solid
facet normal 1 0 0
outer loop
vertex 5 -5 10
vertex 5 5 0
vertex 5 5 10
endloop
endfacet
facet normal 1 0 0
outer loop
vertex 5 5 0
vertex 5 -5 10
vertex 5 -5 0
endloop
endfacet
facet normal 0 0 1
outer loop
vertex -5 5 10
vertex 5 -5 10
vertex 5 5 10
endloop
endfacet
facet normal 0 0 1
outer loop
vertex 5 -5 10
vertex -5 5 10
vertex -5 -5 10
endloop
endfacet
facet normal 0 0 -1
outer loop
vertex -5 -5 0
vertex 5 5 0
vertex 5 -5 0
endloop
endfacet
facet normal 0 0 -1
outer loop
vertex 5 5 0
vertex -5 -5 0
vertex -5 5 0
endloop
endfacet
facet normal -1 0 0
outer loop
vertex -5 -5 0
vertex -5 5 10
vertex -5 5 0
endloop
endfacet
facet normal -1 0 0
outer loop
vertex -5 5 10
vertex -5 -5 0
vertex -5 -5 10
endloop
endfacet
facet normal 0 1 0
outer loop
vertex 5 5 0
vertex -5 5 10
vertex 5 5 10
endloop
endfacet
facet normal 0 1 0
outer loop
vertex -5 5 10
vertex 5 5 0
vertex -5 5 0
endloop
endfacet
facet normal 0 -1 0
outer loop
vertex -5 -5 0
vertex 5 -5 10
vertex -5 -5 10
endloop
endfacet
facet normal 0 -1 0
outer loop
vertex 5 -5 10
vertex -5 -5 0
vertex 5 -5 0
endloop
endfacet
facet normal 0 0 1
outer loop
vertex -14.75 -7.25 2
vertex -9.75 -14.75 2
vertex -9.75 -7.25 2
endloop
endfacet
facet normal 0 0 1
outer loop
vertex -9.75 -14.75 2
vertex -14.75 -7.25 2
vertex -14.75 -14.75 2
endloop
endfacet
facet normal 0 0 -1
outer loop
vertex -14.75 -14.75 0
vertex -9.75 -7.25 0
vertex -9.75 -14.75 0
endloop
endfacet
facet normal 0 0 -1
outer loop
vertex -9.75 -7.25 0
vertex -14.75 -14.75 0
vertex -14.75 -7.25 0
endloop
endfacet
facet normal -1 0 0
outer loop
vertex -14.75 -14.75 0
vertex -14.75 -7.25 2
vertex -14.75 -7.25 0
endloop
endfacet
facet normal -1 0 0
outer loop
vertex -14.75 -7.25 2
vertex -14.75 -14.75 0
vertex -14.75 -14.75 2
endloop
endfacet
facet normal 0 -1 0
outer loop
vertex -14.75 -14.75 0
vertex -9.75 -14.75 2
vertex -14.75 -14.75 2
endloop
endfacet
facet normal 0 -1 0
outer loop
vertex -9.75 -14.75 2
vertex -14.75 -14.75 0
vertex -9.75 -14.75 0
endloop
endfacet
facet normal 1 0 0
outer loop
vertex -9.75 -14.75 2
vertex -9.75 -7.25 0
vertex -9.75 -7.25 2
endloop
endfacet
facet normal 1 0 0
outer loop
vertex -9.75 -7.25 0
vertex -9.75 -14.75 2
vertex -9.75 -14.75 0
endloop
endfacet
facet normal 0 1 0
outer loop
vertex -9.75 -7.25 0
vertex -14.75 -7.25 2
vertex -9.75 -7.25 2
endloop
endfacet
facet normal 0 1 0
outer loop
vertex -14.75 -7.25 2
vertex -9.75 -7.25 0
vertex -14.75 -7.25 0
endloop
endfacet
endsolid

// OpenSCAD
translate([0, 0, 5]) color([0,1,0,0.9]) cube([10, 10, 10], center=true);
translate([-14.5, -14.5, 1]) color([1,0,0]) cube([0.5, 0.5, 2], center=true);
translate([-14.0, -14.5, 1]) color([1,0,0]) cube([0.5, 0.5, 2], center=true);
translate([-13.5, -14.5, 1]) color([1,0,0]) cube([0.5, 0.5, 2], center=true);
translate([-13.0, -14.5, 1]) color([1,0,0]) cube([0.5, 0.5, 2], center=true);
translate([-12.5, -14.5, 1]) color([1,0,0]) cube([0.5, 0.5, 2], center=true);
translate([-12.0, -14.5, 1]) color([1,0,0]) cube([0.5, 0.5, 2], center=true);
translate([-11.5, -14.5, 1]) color([1,0,0]) cube([0.5, 0.5, 2], center=true);
translate([-11.0, -14.5, 1]) color([1,0,0]) cube([0.5, 0.5, 2], center=true);
translate([-10.5, -14.5, 1]) color([1,0,0]) cube([0.5, 0.5, 2], center=true);
translate([-10.0, -14.5, 1]) color([1,0,0]) cube([0.5, 0.5, 2], center=true);
translate([-14.5, -14.0, 1]) color([1,0,0]) cube([0.5, 0.5, 2], center=true);
translate([-14.0, -14.0, 1]) color([1,0,0]) cube([0.5, 0.5, 2], center=true);
translate([-13.5, -14.0, 1]) color([1,0,0]) cube([0.5, 0.5, 2], center=true);
translate([-13.0, -14.0, 1]) color([1,0,0]) cube([0.5, 0.5, 2], center=true);
translate([-12.5, -14.0, 1]) color([1,0,0]) cube([0.5, 0.5, 2], center=true);
translate([-12.0, -14.0, 1]) color([1,0,0]) cube([0.5, 0.5, 2], center=true);
translate([-11.5, -14.0, 1]) color([1,0,0]) cube([0.5, 0.5, 2], center=true);
translate([-11.0, -14.0, 1]) color([1,0,0]) cube([0.5, 0.5, 2], center=true);
translate([-10.5, -14.0, 1]) color([1,0,0]) cube([0.5, 0.5, 2], center=true);
translate([-10.0, -14.0, 1]) color([1,0,0]) cube([0.5, 0.5, 2], center=true);
translate([-14.5, -13.5, 1]) color([1,0,0]) cube([0.5, 0.5, 2], center=true);
translate([-14.0, -13.5, 1]) color([1,0,0]) cube([0.5, 0.5, 2], center=true);
translate([-13.5, -13.5, 1]) color([1,0,0]) cube([0.5, 0.5, 2], center=true);
translate([-13.0, -13.5, 1]) color([1,0,0]) cube([0.5, 0.5, 2], center=true);
translate([-12.5, -13.5, 1]) color([1,0,0]) cube([0.5, 0.5, 2], center=true);
translate([-12.0, -13.5, 1]) color([1,0,0]) cube([0.5, 0.5, 2], center=true);
translate([-11.5, -13.5, 1]) color([1,0,0]) cube([0.5, 0.5, 2], center=true);
translate([-11.0, -13.5, 1]) color([1,0,0]) cube([0.5, 0.5, 2], center=true);
translate([-10.5, -13.5, 1]) color([1,0,0]) cube([0.5, 0.5, 2], center=true);
translate([-10.0, -13.5, 1]) color([1,0,0]) cube([0.5, 0.5, 2], center=true);
translate([-14.5, -13.0, 1]) color([1,0,0]) cube([0.5, 0.5, 2], center=true);
translate([-14.0, -13.0, 1]) color([1,0,0]) cube([0.5, 0.5, 2], center=true);
translate([-13.5, -13.0, 1]) color([1,0,0]) cube([0.5, 0.5, 2], center=true);
translate([-13.0, -13.0, 1]) color([1,0,0]) cube([0.5, 0.5, 2], center=true);
translate([-12.5, -13.0, 1]) color([1,0,0]) cube([0.5, 0.5, 2], center=true);
translate([-12.0, -13.0, 1]) color([1,0,0]) cube([0.5, 0.5, 2], center=true);
translate([-11.5, -13.0, 1]) color([1,0,0]) cube([0.5, 0.5, 2], center=true);
translate([-11.0, -13.0, 1]) color([1,0,0]) cube([0.5, 0.5, 2], center=true);
translate([-10.5, -13.0, 1]) color([1,0,0]) cube([0.5, 0.5, 2], center=true);
translate([-10.0, -13.0, 1]) color([1,0,0]) cube([0.5, 0.5, 2], center=true);
translate([-14.5, -12.5, 1]) color([1,0,0]) cube([0.5, 0.5, 2], center=true);
translate([-14.0, -12.5, 1]) color([1,0,0]) cube([0.5, 0.5, 2], center=true);
translate([-13.5, -12.5, 1]) color([1,0,0]) cube([0.5, 0.5, 2], center=true);
translate([-13.0, -12.5, 1]) color([1,0,0]) cube([0.5, 0.5, 2], center=true);
translate([-12.5, -12.5, 1]) color([1,0,0]) cube([0.5, 0.5, 2], center=true);
translate([-12.0, -12.5, 1]) color([1,0,0]) cube([0.5, 0.5, 2], center=true);
translate([-11.5, -12.5, 1]) color([1,0,0]) cube([0.5, 0.5, 2], center=true);
translate([-11.0, -12.5, 1]) color([1,0,0]) cube([0.5, 0.5, 2], center=true);
translate([-10.5, -12.5, 1]) color([1,0,0]) cube([0.5, 0.5, 2], center=true);
translate([-10.0, -12.5, 1]) color([1,0,0]) cube([0.5, 0.5, 2], center=true);
translate([-14.5, -12.0, 1]) color([1,0,0]) cube([0.5, 0.5, 2], center=true);
translate([-14.0, -12.0, 1]) color([1,0,0]) cube([0.5, 0.5, 2], center=true);
translate([-13.5, -12.0, 1]) color([1,0,0]) cube([0.5, 0.5, 2], center=true);
translate([-13.0, -12.0, 1]) color([1,0,0]) cube([0.5, 0.5, 2], center=true);
translate([-12.5, -12.0, 1]) color([1,0,0]) cube([0.5, 0.5, 2], center=true);
translate([-12.0, -12.0, 1]) color([1,0,0]) cube([0.5, 0.5, 2], center=true);
translate([-11.5, -12.0, 1]) color([1,0,0]) cube([0.5, 0.5, 2], center=true);
translate([-11.0, -12.0, 1]) color([1,0,0]) cube([0.5, 0.5, 2], center=true);
translate([-10.5, -12.0, 1]) color([1,0,0]) cube([0.5, 0.5, 2], center=true);
translate([-10.0, -12.0, 1]) color([1,0,0]) cube([0.5, 0.5, 2], center=true);
translate([-14.5, -11.5, 1]) color([1,0,0]) cube([0.5, 0.5, 2], center=true);
translate([-14.0, -11.5, 1]) color([1,0,0]) cube([0.5, 0.5, 2], center=true);
translate([-13.5, -11.5, 1]) color([1,0,0]) cube([0.5, 0.5, 2], center=true);
translate([-13.0, -11.5, 1]) color([1,0,0]) cube([0.5, 0.5, 2], center=true);
translate([-12.5, -11.5, 1]) color([1,0,0]) cube([0.5, 0.5, 2], center=true);
translate([-12.0, -11.5, 1]) color([1,0,0]) cube([0.5, 0.5, 2], center=true);
translate([-11.5, -11.5, 1]) color([1,0,0]) cube([0.5, 0.5, 2], center=true);
translate([-11.0, -11.5, 1]) color([1,0,0]) cube([0.5, 0.5, 2], center=true);
translate([-10.5, -11.5, 1]) color([1,0,0]) cube([0.5, 0.5, 2], center=true);
translate([-10.0, -11.5, 1]) color([1,0,0]) cube([0.5, 0.5, 2], center=true);
translate([-14.5, -11.0, 1]) color([1,0,0]) cube([0.5, 0.5, 2], center=true);
translate([-14.0, -11.0, 1]) color([1,0,0]) cube([0.5, 0.5, 2], center=true);
translate([-13.5, -11.0, 1]) color([1,0,0]) cube([0.5, 0.5, 2], center=true);
translate([-13.0, -11.0, 1]) color([1,0,0]) cube([0.5, 0.5, 2], center=true);
translate([-12.5, -11.0, 1]) color([1,0,0]) cube([0.5, 0.5, 2], center=true);
translate([-12.0, -11.0, 1]) color([1,0,0]) cube([0.5, 0.5, 2], center=true);
translate([-11.5, -11.0, 1]) color([1,0,0]) cube([0.5, 0.5, 2], center=true);
translate([-11.0, -11.0, 1]) color([1,0,0]) cube([0.5, 0.5, 2], center=true);
translate([-10.5, -11.0, 1]) color([1,0,0]) cube([0.5, 0.5, 2], center=true);
translate([-10.0, -11.0, 1]) color([1,0,0]) cube([0.5, 0.5, 2], center=true);
translate([-14.5, -10.5, 1]) color([1,0,0]) cube([0.5, 0.5, 2], center=true);
translate([-14.0, -10.5, 1]) color([1,0,0]) cube([0.5, 0.5, 2], center=true);
translate([-13.5, -10.5, 1]) color([1,0,0]) cube([0.5, 0.5, 2], center=true);
translate([-13.0, -10.5, 1]) color([1,0,0]) cube([0.5, 0.5, 2], center=true);
translate([-12.5, -10.5, 1]) color([1,0,0]) cube([0.5, 0.5, 2], center=true);
translate([-12.0, -10.5, 1]) color([1,0,0]) cube([0.5, 0.5, 2], center=true);
translate([-11.5, -10.5, 1]) color([1,0,0]) cube([0.5, 0.5, 2], center=true);
translate([-11.0, -10.5, 1]) color([1,0,0]) cube([0.5, 0.5, 2], center=true);
translate([-10.5, -10.5, 1]) color([1,0,0]) cube([0.5, 0.5, 2], center=true);
translate([-10.0, -10.5, 1]) color([1,0,0]) cube([0.5, 0.5, 2], center=true);
translate([-14.5, -10.0, 1]) color([1,0,0]) cube([0.5, 0.5, 2], center=true);
translate([-14.0, -10.0, 1]) color([1,0,0]) cube([0.5, 0.5, 2], center=true);
translate([-13.5, -10.0, 1]) color([1,0,0]) cube([0.5, 0.5, 2], center=true);
translate([-13.0, -10.0, 1]) color([1,0,0]) cube([0.5, 0.5, 2], center=true);
translate([-12.5, -10.0, 1]) color([1,0,0]) cube([0.5, 0.5, 2], center=true);
translate([-12.0, -10.0, 1]) color([1,0,0]) cube([0.5, 0.5, 2], center=true);
translate([-11.5, -10.0, 1]) color([1,0,0]) cube([0.5, 0.5, 2], center=true);
translate([-11.0, -10.0, 1]) color([1,0,0]) cube([0.5, 0.5, 2], center=true);
translate([-10.5, -10.0, 1]) color([1,0,0]) cube([0.5, 0.5, 2], center=true);
translate([-10.0, -10.0, 1]) color([1,0,0]) cube([0.5, 0.5, 2], center=true);
translate([-14.5, -9.5, 1]) color([1,0,0]) cube([0.5, 0.5, 2], center=true);
translate([-14.0, -9.5, 1]) color([1,0,0]) cube([0.5, 0.5, 2], center=true);
translate([-13.5, -9.5, 1]) color([1,0,0]) cube([0.5, 0.5, 2], center=true);
translate([-13.0, -9.5, 1]) color([1,0,0]) cube([0.5, 0.5, 2], center=true);
translate([-12.5, -9.5, 1]) color([1,0,0]) cube([0.5, 0.5, 2], center=true);
translate([-12.0, -9.5, 1]) color([1,0,0]) cube([0.5, 0.5, 2], center=true);
translate([-11.5, -9.5, 1]) color([1,0,0]) cube([0.5, 0.5, 2], center=true);
translate([-11.0, -9.5, 1]) color([1,0,0]) cube([0.5, 0.5, 2], center=true);
translate([-10.5, -9.5, 1]) color([1,0,0]) cube([0.5, 0.5, 2], center=true);
translate([-10.0, -9.5, 1]) color([1,0,0]) cube([0.5, 0.5, 2], center=true);
translate([-14.5, -9.0, 1]) color([1,0,0]) cube([0.5, 0.5, 2], center=true);
translate([-14.0, -9.0, 1]) color([1,0,0]) cube([0.5, 0.5, 2], center=true);
translate([-13.5, -9.0, 1]) color([1,0,0]) cube([0.5, 0.5, 2], center=true);
translate([-13.0, -9.0, 1]) color([1,0,0]) cube([0.5, 0.5, 2], center=true);
translate([-12.5, -9.0, 1]) color([1,0,0]) cube([0.5, 0.5, 2], center=true);
translate([-12.0, -9.0, 1]) color([1,0,0]) cube([0.5, 0.5, 2], center=true);
translate([-11.5, -9.0, 1]) color([1,0,0]) cube([0.5, 0.5, 2], center=true);
translate([-11.0, -9.0, 1]) color([1,0,0]) cube([0.5, 0.5, 2], center=true);
translate([-10.5, -9.0, 1]) color([1,0,0]) cube([0.5, 0.5, 2], center=true);
translate([-10.0, -9.0, 1]) color([1,0,0]) cube([0.5, 0.5, 2], center=true);
translate([-14.5, -8.5, 1]) color([1,0,0]) cube([0.5, 0.5, 2], center=true);
translate([-14.0, -8.5, 1]) color([1,0,0]) cube([0.5, 0.5, 2], center=true);
translate([-13.5, -8.5, 1]) color([1,0,0]) cube([0.5, 0.5, 2], center=true);
translate([-13.0, -8.5, 1]) color([1,0,0]) cube([0.5, 0.5, 2], center=true);
translate([-12.5, -8.5, 1]) color([1,0,0]) cube([0.5, 0.5, 2], center=true);
translate([-12.0, -8.5, 1]) color([1,0,0]) cube([0.5, 0.5, 2], center=true);
translate([-11.5, -8.5, 1]) color([1,0,0]) cube([0.5, 0.5, 2], center=true);
translate([-11.0, -8.5, 1]) color([1,0,0]) cube([0.5, 0.5, 2], center=true);
translate([-10.5, -8.5, 1]) color([1,0,0]) cube([0.5, 0.5, 2], center=true);
translate([-10.0, -8.5, 1]) color([1,0,0]) cube([0.5, 0.5, 2], center=true);
translate([-14.5, -8.0, 1]) color([1,0,0]) cube([0.5, 0.5, 2], center=true);
translate([-14.0, -8.0, 1]) color([1,0,0]) cube([0.5, 0.5, 2], center=true);
translate([-13.5, -8.0, 1]) color([1,0,0]) cube([0.5, 0.5, 2], center=true);
translate([-13.0, -8.0, 1]) color([1,0,0]) cube([0.5, 0.5, 2], center=true);
translate([-12.5, -8.0, 1]) color([1,0,0]) cube([0.5, 0.5, 2], center=true);
translate([-12.0, -8.0, 1]) color([1,0,0]) cube([0.5, 0.5, 2], center=true);
translate([-11.5, -8.0, 1]) color([1,0,0]) cube([0.5, 0.5, 2], center=true);
translate([-11.0, -8.0, 1]) color([1,0,0]) cube([0.5, 0.5, 2], center=true);
translate([-10.5, -8.0, 1]) color([1,0,0]) cube([0.5, 0.5, 2], center=true);
translate([-10.0, -8.0, 1]) color([1,0,0]) cube([0.5, 0.5, 2], center=true);
translate([-14.5, -7.5, 1]) color([1,0,0]) cube([0.5, 0.5, 2], center=true);
translate([-14.0, -7.5, 1]) color([1,0,0]) cube([0.5, 0.5, 2], center=true);
translate([-13.5, -7.5, 1]) color([1,0,0]) cube([0.5, 0.5, 2], center=true);
translate([-13.0, -7.5, 1]) color([1,0,0]) cube([0.5, 0.5, 2], center=true);
translate([-12.5, -7.5, 1]) color([1,0,0]) cube([0.5, 0.5, 2], center=true);
translate([-12.0, -7.5, 1]) color([1,0,0]) cube([0.5, 0.5, 2], center=true);
translate([-11.5, -7.5, 1]) color([1,0,0]) cube([0.5, 0.5, 2], center=true);
translate([-11.0, -7.5, 1]) color([1,0,0]) cube([0.5, 0.5, 2], center=true);
translate([-10.5, -7.5, 1]) color([1,0,0]) cube([0.5, 0.5, 2], center=true);
translate([-10.0, -7.5, 1]) color([1,0,0]) cube([0.5, 0.5, 2], center=true);
